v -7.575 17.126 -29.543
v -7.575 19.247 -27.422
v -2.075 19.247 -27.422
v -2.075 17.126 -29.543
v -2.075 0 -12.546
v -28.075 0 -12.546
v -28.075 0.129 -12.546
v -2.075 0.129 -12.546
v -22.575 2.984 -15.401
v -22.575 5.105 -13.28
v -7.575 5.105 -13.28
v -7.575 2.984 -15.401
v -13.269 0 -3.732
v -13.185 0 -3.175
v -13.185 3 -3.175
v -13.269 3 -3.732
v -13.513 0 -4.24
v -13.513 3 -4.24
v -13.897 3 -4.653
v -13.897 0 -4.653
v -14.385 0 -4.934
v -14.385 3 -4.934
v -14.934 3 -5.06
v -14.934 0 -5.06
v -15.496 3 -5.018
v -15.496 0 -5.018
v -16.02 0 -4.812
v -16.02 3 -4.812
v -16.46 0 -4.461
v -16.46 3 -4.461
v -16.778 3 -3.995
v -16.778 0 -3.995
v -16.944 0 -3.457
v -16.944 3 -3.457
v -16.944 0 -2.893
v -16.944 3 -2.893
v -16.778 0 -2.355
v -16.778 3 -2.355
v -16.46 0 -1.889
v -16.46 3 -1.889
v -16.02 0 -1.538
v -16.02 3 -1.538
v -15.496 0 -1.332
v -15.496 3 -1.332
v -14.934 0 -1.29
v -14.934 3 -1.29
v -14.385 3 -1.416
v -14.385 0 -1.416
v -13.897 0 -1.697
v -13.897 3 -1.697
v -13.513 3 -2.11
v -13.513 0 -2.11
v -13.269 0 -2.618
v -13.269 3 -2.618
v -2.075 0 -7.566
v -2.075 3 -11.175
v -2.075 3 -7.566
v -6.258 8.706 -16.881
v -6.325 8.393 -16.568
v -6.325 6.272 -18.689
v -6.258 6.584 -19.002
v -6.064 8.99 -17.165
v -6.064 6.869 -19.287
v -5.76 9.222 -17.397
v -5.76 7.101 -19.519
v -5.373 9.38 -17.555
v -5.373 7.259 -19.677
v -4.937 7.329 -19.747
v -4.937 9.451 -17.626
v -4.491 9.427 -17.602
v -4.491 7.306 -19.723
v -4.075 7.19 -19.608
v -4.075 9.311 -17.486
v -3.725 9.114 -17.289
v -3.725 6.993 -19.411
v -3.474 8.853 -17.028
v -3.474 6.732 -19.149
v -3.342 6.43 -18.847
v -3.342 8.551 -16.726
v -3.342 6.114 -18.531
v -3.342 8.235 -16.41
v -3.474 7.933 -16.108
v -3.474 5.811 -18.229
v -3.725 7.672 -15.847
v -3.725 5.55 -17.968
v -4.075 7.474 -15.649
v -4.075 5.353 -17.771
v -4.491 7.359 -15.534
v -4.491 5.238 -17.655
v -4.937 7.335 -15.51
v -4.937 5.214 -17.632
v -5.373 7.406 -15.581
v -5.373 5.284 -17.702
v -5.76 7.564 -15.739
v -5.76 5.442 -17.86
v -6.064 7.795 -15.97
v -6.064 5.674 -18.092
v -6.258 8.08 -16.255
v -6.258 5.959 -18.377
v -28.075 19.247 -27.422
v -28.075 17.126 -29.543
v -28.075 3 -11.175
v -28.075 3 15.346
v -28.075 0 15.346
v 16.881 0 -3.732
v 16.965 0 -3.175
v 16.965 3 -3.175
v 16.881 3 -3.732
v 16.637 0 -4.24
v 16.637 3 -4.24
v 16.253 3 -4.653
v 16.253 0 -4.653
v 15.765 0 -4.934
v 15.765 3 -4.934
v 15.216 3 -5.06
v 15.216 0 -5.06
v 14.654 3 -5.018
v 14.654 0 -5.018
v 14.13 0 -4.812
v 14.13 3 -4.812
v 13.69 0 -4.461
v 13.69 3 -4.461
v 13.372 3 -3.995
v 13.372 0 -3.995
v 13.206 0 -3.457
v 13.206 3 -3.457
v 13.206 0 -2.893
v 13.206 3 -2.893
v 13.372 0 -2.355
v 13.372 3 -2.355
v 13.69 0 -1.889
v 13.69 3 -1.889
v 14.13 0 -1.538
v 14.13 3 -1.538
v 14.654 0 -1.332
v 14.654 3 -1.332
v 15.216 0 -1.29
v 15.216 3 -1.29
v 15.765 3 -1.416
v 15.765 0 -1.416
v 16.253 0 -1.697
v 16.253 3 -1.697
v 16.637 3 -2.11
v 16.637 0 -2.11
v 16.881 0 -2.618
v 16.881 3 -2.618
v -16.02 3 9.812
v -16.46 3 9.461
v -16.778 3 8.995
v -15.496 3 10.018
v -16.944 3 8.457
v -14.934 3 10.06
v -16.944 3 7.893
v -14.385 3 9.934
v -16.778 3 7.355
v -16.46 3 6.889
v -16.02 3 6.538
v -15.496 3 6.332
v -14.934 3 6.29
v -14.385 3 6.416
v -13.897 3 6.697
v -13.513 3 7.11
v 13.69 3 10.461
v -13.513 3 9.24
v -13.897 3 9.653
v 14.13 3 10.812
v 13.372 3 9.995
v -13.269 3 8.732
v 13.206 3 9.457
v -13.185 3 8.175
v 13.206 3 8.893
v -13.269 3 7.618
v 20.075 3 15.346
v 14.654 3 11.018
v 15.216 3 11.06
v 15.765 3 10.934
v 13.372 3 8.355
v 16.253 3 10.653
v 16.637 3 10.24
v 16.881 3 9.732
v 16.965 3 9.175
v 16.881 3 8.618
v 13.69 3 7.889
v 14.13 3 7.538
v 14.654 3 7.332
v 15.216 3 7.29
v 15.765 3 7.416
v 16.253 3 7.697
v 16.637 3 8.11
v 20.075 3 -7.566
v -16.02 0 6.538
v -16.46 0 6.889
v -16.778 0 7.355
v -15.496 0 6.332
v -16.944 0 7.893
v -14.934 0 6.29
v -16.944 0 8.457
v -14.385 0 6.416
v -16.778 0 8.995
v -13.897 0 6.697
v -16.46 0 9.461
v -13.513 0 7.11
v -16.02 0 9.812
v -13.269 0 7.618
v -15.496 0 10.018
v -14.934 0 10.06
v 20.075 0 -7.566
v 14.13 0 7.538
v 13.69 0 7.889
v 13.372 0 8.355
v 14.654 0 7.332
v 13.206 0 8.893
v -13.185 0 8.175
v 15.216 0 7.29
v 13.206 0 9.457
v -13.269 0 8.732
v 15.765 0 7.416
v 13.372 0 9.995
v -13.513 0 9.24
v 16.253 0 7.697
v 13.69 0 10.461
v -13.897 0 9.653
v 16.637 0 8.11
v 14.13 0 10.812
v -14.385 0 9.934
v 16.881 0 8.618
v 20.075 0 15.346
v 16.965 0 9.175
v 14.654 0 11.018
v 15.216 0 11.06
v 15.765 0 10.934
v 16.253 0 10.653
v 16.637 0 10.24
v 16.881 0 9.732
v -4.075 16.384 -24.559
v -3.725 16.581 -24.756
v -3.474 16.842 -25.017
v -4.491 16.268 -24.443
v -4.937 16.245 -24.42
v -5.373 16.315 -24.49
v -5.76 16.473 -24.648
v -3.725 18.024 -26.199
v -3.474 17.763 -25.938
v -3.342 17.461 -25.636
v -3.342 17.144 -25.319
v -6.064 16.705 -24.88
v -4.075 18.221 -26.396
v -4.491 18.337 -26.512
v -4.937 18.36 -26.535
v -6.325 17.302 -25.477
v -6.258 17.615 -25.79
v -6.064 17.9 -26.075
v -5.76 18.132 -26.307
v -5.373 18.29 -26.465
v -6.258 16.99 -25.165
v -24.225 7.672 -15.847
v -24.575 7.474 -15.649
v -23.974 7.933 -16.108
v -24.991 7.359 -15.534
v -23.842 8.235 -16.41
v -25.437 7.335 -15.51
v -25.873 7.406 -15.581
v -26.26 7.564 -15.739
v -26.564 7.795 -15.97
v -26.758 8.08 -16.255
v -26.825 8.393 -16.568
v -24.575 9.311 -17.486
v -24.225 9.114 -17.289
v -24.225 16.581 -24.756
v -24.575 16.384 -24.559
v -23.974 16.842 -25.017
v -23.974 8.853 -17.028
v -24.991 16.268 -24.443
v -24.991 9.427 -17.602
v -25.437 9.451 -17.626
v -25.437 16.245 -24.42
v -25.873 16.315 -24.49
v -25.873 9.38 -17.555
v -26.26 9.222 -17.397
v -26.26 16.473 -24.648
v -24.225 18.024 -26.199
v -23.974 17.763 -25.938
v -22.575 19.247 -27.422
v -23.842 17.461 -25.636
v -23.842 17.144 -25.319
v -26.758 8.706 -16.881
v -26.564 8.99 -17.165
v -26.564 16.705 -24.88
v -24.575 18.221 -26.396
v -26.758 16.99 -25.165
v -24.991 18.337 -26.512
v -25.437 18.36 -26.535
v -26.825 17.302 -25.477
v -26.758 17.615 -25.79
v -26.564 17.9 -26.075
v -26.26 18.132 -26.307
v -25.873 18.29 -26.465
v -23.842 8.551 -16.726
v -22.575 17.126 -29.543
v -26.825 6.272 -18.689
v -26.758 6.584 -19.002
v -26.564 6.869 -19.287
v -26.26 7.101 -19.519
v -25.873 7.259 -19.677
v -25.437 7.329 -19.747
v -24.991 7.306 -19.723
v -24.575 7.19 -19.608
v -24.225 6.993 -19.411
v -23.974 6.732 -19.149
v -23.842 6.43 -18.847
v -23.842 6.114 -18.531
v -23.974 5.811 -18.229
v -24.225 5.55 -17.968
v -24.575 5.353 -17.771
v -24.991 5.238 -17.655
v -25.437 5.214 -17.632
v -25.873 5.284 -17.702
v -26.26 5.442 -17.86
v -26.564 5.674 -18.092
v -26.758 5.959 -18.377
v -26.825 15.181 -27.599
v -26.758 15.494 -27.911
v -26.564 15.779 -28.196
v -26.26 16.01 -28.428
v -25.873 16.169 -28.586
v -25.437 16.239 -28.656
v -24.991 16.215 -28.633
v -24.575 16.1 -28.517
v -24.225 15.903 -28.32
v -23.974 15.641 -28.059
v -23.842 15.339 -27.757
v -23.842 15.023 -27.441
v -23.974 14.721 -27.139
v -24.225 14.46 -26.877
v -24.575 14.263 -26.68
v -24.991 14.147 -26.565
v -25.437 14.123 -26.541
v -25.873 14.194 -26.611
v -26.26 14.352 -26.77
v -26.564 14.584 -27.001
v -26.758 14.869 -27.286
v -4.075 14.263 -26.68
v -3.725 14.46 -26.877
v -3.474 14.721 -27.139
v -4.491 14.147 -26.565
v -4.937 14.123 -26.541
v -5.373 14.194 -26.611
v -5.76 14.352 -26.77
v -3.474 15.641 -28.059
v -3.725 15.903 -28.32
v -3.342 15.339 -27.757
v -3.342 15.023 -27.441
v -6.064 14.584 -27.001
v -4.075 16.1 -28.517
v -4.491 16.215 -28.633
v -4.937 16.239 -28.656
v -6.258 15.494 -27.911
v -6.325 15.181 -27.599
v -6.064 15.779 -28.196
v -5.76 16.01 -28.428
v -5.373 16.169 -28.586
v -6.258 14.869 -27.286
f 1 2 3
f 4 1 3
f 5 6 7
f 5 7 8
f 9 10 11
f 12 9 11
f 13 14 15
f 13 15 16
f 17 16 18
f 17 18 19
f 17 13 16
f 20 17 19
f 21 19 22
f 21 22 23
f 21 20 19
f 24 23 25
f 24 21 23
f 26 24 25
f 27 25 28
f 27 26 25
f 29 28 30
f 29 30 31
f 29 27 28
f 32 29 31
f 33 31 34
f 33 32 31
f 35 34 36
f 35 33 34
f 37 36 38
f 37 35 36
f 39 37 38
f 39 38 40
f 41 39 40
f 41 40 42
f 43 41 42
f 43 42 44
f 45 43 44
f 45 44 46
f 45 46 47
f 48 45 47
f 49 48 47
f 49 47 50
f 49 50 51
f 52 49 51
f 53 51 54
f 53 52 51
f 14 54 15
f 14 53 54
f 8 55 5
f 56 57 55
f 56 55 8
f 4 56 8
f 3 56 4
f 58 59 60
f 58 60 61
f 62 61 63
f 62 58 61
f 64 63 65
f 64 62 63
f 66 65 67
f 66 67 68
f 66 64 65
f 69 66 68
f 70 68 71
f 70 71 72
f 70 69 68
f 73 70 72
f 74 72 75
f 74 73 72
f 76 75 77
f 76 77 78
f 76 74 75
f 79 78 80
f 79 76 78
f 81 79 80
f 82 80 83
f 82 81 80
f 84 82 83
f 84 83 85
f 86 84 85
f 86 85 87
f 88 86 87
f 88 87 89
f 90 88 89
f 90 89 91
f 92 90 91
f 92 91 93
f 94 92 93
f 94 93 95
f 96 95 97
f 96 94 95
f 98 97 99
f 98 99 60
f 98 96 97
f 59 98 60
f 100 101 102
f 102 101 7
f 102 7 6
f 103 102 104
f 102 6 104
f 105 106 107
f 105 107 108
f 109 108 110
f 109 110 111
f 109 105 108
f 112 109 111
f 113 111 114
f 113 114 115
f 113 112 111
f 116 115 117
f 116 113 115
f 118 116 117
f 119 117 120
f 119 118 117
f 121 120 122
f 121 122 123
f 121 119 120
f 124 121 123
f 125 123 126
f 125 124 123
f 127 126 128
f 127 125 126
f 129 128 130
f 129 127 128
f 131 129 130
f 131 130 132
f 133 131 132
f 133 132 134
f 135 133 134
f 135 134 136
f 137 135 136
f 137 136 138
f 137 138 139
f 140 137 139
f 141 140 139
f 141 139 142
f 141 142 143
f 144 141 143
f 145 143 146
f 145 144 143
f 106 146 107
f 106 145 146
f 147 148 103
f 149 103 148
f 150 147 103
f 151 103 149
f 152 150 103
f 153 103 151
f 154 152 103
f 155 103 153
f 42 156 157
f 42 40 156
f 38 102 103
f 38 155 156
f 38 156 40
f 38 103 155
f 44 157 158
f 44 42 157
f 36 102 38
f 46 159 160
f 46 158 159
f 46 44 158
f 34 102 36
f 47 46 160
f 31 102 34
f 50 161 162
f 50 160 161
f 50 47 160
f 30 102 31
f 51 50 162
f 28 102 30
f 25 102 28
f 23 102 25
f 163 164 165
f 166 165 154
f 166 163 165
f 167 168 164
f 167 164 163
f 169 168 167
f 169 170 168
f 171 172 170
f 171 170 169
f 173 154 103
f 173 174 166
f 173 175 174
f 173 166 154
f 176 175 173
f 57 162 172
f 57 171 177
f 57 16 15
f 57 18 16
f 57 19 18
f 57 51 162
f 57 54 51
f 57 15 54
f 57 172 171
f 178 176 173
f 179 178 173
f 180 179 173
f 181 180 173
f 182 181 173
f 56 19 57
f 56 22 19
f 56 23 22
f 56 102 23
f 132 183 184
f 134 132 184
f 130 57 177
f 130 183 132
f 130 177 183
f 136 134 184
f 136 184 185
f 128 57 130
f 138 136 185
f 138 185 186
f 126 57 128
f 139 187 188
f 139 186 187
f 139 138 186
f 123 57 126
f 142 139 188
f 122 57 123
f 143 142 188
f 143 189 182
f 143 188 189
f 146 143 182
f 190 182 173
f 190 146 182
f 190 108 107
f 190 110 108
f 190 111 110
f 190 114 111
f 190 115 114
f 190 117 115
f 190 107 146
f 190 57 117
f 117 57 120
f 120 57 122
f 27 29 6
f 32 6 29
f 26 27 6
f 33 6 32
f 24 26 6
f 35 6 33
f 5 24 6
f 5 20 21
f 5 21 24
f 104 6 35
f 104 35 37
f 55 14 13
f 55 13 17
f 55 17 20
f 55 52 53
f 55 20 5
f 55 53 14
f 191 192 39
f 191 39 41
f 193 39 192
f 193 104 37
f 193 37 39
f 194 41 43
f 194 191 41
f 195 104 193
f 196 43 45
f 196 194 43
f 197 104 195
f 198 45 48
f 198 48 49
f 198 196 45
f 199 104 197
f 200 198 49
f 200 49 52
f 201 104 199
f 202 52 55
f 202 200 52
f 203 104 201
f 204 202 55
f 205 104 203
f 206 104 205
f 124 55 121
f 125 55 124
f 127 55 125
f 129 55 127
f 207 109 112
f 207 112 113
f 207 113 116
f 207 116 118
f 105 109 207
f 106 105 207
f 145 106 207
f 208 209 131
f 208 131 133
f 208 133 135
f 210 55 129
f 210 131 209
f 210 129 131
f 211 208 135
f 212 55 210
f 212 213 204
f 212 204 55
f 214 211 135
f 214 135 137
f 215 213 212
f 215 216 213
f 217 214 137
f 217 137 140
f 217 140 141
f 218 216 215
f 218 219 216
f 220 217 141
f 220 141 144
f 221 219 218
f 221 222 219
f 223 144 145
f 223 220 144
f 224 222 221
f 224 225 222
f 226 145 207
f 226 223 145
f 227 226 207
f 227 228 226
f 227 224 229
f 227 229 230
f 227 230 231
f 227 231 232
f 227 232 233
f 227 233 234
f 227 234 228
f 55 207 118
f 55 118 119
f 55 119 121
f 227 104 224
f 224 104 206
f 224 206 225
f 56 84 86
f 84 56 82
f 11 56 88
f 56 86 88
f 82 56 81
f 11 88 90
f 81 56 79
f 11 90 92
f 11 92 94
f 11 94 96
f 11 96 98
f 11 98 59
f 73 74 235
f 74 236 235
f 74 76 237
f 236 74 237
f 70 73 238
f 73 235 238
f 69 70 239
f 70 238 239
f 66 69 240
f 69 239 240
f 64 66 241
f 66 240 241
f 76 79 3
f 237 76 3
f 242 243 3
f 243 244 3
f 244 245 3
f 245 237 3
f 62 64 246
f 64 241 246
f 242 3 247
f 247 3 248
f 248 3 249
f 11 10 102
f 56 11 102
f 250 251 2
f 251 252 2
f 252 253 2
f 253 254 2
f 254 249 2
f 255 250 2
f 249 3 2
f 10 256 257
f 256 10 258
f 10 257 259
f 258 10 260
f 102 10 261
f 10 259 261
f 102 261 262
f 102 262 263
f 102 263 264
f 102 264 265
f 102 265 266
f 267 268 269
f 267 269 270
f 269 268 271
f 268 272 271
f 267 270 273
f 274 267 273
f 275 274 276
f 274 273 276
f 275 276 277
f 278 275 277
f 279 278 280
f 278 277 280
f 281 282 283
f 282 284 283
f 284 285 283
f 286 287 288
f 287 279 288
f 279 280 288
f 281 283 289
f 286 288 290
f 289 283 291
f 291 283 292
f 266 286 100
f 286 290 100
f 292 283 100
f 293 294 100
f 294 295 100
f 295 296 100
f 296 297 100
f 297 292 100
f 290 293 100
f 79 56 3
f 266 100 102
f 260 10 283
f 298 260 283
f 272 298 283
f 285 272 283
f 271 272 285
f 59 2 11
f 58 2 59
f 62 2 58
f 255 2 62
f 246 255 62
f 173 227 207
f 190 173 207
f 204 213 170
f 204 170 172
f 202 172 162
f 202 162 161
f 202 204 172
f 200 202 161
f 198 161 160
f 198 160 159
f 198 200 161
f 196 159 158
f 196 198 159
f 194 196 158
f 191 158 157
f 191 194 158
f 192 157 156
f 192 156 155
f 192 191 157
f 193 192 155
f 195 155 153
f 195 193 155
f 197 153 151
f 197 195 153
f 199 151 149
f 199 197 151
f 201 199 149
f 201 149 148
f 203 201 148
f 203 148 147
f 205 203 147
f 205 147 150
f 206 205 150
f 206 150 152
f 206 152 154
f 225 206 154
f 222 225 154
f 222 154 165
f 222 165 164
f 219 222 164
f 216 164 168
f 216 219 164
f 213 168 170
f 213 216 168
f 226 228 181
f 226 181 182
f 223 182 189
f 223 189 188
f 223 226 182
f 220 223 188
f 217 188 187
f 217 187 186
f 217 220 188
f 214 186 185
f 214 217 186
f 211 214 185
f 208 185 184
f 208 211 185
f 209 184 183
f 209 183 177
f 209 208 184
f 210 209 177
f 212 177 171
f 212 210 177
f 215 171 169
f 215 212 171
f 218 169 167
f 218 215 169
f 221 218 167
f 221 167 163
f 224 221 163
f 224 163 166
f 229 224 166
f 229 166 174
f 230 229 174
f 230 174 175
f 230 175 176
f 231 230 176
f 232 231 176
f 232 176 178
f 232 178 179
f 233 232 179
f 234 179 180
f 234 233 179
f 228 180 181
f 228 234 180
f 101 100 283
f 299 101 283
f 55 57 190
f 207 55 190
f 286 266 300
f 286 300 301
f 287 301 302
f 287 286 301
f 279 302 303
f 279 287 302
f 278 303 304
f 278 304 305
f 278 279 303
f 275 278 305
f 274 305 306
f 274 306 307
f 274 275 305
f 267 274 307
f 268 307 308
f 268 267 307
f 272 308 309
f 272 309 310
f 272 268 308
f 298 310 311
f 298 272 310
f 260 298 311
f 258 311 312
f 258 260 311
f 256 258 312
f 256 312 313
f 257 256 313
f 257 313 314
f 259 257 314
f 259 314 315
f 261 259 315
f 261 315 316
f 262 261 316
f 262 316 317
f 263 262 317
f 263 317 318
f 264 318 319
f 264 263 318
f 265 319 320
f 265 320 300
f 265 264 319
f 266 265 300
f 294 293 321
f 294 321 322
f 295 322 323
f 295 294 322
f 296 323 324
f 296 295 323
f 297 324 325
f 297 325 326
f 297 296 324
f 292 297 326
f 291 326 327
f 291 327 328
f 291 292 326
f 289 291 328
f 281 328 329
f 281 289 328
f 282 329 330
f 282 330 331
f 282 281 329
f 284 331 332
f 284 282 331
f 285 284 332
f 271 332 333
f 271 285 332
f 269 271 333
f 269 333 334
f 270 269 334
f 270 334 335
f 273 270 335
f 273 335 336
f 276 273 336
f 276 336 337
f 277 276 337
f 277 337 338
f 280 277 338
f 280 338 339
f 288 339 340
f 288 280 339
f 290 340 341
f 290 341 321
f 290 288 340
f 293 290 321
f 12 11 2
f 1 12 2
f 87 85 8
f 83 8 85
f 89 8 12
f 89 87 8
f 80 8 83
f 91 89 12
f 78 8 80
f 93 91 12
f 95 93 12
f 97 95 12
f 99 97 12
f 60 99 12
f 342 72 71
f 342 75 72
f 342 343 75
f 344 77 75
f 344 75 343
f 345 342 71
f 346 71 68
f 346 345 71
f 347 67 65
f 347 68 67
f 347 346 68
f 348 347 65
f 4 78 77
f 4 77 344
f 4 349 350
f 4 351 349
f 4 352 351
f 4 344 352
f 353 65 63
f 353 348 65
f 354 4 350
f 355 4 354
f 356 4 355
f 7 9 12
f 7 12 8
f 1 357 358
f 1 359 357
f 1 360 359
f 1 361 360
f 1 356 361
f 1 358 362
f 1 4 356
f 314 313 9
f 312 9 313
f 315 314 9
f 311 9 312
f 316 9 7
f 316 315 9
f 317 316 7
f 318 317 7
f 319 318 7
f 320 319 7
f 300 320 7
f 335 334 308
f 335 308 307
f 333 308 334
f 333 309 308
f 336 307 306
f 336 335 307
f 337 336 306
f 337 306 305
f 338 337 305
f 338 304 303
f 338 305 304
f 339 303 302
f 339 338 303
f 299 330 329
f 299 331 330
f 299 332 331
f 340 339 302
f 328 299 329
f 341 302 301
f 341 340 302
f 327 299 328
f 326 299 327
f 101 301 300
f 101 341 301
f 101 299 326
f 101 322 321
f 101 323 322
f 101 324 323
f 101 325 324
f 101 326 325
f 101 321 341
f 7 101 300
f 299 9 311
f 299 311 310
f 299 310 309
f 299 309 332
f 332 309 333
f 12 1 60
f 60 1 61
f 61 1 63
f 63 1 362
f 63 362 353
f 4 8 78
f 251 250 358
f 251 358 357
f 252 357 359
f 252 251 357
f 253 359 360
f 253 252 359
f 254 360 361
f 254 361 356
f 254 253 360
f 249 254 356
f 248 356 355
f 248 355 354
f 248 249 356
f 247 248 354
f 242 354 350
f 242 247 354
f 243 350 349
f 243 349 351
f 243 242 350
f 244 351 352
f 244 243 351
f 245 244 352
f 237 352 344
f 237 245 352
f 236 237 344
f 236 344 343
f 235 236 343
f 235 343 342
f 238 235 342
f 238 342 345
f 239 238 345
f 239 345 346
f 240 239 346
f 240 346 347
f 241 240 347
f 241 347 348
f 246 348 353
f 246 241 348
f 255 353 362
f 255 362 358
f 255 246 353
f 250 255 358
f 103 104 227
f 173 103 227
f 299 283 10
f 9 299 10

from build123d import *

# Parameters (mm, degrees)
SKETCH2_W           = 48.15
SKETCH2_H           = 26.520901759
SKETCH2_R           = 1.89
BOSS_EXTRUDE1_DEPTH = 3
SKETCH6_R           = 1.5
BOSS_EXTRUDE2_DEPTH = 3
SKETCH7_W           = 26
SKETCH7_H           = 2.377108006
BOSS_EXTRUDE3_DEPTH = 2
SKETCH8_W           = 22.15
SKETCH8_H           = 3.609216989
CUT_EXTRUDE1_DEPTH  = 3


with BuildPart() as part:
    # Sketch2 → Boss-Extrude1 (new body)
    with BuildSketch(Plane(origin=(0, 0, 0), x_dir=(1, 0, 0), z_dir=(0, 1, 0))):
        with Locations((-4, -2.085450879)):
            Rectangle(SKETCH2_W, SKETCH2_H)
        with Locations((-15.075, -8.175)):
            Circle(SKETCH2_R, mode=Mode.SUBTRACT)
        with Locations((-15.075, 3.175)):
            Circle(SKETCH2_R, mode=Mode.SUBTRACT)
        with Locations((15.075, 3.175)):
            Circle(SKETCH2_R, mode=Mode.SUBTRACT)
        with Locations((15.075, -9.175)):
            Circle(SKETCH2_R, mode=Mode.SUBTRACT)
    extrude(amount=BOSS_EXTRUDE1_DEPTH)

    # Sketch6 → Boss-Extrude2 (add)
    with BuildSketch(Plane(origin=(0, -4.0875, -4.0875), x_dir=(-1, 0, 0), z_dir=(0, -0.707106781, -0.707106781))):
        Polygon((2.075, 8.962578452), (28.075, 8.962578452), (28.075, 33), (22.575, 33), (22.575, 13), (7.575, 13), (7.575, 33), (2.075, 33), align=None)
        with Locations((4.825, 17.65)):
            Circle(SKETCH6_R, mode=Mode.SUBTRACT)
        with Locations((25.325, 17.65)):
            Circle(SKETCH6_R, mode=Mode.SUBTRACT)
        with Locations((4.825, 30.25)):
            Circle(SKETCH6_R, mode=Mode.SUBTRACT)
        with Locations((25.325, 30.25)):
            Circle(SKETCH6_R, mode=Mode.SUBTRACT)
    extrude(amount=BOSS_EXTRUDE2_DEPTH)

    # Sketch7 → Boss-Extrude3 (add)
    with BuildSketch(Plane.XZ):
        with Locations((-15.075, -11.357766341)):
            Rectangle(SKETCH7_W, SKETCH7_H)
    extrude(amount=-BOSS_EXTRUDE3_DEPTH)

    # Sketch8 → Cut-Extrude1 (cut)
    with BuildSketch(Plane(origin=(0, 3, 0), x_dir=(1, 0, 0), z_dir=(0, 1, 0))):
        with Locations((9, 9.370391506)):
            Rectangle(SKETCH8_W, SKETCH8_H)
    extrude(amount=-CUT_EXTRUDE1_DEPTH, mode=Mode.SUBTRACT)


solid = part.part
